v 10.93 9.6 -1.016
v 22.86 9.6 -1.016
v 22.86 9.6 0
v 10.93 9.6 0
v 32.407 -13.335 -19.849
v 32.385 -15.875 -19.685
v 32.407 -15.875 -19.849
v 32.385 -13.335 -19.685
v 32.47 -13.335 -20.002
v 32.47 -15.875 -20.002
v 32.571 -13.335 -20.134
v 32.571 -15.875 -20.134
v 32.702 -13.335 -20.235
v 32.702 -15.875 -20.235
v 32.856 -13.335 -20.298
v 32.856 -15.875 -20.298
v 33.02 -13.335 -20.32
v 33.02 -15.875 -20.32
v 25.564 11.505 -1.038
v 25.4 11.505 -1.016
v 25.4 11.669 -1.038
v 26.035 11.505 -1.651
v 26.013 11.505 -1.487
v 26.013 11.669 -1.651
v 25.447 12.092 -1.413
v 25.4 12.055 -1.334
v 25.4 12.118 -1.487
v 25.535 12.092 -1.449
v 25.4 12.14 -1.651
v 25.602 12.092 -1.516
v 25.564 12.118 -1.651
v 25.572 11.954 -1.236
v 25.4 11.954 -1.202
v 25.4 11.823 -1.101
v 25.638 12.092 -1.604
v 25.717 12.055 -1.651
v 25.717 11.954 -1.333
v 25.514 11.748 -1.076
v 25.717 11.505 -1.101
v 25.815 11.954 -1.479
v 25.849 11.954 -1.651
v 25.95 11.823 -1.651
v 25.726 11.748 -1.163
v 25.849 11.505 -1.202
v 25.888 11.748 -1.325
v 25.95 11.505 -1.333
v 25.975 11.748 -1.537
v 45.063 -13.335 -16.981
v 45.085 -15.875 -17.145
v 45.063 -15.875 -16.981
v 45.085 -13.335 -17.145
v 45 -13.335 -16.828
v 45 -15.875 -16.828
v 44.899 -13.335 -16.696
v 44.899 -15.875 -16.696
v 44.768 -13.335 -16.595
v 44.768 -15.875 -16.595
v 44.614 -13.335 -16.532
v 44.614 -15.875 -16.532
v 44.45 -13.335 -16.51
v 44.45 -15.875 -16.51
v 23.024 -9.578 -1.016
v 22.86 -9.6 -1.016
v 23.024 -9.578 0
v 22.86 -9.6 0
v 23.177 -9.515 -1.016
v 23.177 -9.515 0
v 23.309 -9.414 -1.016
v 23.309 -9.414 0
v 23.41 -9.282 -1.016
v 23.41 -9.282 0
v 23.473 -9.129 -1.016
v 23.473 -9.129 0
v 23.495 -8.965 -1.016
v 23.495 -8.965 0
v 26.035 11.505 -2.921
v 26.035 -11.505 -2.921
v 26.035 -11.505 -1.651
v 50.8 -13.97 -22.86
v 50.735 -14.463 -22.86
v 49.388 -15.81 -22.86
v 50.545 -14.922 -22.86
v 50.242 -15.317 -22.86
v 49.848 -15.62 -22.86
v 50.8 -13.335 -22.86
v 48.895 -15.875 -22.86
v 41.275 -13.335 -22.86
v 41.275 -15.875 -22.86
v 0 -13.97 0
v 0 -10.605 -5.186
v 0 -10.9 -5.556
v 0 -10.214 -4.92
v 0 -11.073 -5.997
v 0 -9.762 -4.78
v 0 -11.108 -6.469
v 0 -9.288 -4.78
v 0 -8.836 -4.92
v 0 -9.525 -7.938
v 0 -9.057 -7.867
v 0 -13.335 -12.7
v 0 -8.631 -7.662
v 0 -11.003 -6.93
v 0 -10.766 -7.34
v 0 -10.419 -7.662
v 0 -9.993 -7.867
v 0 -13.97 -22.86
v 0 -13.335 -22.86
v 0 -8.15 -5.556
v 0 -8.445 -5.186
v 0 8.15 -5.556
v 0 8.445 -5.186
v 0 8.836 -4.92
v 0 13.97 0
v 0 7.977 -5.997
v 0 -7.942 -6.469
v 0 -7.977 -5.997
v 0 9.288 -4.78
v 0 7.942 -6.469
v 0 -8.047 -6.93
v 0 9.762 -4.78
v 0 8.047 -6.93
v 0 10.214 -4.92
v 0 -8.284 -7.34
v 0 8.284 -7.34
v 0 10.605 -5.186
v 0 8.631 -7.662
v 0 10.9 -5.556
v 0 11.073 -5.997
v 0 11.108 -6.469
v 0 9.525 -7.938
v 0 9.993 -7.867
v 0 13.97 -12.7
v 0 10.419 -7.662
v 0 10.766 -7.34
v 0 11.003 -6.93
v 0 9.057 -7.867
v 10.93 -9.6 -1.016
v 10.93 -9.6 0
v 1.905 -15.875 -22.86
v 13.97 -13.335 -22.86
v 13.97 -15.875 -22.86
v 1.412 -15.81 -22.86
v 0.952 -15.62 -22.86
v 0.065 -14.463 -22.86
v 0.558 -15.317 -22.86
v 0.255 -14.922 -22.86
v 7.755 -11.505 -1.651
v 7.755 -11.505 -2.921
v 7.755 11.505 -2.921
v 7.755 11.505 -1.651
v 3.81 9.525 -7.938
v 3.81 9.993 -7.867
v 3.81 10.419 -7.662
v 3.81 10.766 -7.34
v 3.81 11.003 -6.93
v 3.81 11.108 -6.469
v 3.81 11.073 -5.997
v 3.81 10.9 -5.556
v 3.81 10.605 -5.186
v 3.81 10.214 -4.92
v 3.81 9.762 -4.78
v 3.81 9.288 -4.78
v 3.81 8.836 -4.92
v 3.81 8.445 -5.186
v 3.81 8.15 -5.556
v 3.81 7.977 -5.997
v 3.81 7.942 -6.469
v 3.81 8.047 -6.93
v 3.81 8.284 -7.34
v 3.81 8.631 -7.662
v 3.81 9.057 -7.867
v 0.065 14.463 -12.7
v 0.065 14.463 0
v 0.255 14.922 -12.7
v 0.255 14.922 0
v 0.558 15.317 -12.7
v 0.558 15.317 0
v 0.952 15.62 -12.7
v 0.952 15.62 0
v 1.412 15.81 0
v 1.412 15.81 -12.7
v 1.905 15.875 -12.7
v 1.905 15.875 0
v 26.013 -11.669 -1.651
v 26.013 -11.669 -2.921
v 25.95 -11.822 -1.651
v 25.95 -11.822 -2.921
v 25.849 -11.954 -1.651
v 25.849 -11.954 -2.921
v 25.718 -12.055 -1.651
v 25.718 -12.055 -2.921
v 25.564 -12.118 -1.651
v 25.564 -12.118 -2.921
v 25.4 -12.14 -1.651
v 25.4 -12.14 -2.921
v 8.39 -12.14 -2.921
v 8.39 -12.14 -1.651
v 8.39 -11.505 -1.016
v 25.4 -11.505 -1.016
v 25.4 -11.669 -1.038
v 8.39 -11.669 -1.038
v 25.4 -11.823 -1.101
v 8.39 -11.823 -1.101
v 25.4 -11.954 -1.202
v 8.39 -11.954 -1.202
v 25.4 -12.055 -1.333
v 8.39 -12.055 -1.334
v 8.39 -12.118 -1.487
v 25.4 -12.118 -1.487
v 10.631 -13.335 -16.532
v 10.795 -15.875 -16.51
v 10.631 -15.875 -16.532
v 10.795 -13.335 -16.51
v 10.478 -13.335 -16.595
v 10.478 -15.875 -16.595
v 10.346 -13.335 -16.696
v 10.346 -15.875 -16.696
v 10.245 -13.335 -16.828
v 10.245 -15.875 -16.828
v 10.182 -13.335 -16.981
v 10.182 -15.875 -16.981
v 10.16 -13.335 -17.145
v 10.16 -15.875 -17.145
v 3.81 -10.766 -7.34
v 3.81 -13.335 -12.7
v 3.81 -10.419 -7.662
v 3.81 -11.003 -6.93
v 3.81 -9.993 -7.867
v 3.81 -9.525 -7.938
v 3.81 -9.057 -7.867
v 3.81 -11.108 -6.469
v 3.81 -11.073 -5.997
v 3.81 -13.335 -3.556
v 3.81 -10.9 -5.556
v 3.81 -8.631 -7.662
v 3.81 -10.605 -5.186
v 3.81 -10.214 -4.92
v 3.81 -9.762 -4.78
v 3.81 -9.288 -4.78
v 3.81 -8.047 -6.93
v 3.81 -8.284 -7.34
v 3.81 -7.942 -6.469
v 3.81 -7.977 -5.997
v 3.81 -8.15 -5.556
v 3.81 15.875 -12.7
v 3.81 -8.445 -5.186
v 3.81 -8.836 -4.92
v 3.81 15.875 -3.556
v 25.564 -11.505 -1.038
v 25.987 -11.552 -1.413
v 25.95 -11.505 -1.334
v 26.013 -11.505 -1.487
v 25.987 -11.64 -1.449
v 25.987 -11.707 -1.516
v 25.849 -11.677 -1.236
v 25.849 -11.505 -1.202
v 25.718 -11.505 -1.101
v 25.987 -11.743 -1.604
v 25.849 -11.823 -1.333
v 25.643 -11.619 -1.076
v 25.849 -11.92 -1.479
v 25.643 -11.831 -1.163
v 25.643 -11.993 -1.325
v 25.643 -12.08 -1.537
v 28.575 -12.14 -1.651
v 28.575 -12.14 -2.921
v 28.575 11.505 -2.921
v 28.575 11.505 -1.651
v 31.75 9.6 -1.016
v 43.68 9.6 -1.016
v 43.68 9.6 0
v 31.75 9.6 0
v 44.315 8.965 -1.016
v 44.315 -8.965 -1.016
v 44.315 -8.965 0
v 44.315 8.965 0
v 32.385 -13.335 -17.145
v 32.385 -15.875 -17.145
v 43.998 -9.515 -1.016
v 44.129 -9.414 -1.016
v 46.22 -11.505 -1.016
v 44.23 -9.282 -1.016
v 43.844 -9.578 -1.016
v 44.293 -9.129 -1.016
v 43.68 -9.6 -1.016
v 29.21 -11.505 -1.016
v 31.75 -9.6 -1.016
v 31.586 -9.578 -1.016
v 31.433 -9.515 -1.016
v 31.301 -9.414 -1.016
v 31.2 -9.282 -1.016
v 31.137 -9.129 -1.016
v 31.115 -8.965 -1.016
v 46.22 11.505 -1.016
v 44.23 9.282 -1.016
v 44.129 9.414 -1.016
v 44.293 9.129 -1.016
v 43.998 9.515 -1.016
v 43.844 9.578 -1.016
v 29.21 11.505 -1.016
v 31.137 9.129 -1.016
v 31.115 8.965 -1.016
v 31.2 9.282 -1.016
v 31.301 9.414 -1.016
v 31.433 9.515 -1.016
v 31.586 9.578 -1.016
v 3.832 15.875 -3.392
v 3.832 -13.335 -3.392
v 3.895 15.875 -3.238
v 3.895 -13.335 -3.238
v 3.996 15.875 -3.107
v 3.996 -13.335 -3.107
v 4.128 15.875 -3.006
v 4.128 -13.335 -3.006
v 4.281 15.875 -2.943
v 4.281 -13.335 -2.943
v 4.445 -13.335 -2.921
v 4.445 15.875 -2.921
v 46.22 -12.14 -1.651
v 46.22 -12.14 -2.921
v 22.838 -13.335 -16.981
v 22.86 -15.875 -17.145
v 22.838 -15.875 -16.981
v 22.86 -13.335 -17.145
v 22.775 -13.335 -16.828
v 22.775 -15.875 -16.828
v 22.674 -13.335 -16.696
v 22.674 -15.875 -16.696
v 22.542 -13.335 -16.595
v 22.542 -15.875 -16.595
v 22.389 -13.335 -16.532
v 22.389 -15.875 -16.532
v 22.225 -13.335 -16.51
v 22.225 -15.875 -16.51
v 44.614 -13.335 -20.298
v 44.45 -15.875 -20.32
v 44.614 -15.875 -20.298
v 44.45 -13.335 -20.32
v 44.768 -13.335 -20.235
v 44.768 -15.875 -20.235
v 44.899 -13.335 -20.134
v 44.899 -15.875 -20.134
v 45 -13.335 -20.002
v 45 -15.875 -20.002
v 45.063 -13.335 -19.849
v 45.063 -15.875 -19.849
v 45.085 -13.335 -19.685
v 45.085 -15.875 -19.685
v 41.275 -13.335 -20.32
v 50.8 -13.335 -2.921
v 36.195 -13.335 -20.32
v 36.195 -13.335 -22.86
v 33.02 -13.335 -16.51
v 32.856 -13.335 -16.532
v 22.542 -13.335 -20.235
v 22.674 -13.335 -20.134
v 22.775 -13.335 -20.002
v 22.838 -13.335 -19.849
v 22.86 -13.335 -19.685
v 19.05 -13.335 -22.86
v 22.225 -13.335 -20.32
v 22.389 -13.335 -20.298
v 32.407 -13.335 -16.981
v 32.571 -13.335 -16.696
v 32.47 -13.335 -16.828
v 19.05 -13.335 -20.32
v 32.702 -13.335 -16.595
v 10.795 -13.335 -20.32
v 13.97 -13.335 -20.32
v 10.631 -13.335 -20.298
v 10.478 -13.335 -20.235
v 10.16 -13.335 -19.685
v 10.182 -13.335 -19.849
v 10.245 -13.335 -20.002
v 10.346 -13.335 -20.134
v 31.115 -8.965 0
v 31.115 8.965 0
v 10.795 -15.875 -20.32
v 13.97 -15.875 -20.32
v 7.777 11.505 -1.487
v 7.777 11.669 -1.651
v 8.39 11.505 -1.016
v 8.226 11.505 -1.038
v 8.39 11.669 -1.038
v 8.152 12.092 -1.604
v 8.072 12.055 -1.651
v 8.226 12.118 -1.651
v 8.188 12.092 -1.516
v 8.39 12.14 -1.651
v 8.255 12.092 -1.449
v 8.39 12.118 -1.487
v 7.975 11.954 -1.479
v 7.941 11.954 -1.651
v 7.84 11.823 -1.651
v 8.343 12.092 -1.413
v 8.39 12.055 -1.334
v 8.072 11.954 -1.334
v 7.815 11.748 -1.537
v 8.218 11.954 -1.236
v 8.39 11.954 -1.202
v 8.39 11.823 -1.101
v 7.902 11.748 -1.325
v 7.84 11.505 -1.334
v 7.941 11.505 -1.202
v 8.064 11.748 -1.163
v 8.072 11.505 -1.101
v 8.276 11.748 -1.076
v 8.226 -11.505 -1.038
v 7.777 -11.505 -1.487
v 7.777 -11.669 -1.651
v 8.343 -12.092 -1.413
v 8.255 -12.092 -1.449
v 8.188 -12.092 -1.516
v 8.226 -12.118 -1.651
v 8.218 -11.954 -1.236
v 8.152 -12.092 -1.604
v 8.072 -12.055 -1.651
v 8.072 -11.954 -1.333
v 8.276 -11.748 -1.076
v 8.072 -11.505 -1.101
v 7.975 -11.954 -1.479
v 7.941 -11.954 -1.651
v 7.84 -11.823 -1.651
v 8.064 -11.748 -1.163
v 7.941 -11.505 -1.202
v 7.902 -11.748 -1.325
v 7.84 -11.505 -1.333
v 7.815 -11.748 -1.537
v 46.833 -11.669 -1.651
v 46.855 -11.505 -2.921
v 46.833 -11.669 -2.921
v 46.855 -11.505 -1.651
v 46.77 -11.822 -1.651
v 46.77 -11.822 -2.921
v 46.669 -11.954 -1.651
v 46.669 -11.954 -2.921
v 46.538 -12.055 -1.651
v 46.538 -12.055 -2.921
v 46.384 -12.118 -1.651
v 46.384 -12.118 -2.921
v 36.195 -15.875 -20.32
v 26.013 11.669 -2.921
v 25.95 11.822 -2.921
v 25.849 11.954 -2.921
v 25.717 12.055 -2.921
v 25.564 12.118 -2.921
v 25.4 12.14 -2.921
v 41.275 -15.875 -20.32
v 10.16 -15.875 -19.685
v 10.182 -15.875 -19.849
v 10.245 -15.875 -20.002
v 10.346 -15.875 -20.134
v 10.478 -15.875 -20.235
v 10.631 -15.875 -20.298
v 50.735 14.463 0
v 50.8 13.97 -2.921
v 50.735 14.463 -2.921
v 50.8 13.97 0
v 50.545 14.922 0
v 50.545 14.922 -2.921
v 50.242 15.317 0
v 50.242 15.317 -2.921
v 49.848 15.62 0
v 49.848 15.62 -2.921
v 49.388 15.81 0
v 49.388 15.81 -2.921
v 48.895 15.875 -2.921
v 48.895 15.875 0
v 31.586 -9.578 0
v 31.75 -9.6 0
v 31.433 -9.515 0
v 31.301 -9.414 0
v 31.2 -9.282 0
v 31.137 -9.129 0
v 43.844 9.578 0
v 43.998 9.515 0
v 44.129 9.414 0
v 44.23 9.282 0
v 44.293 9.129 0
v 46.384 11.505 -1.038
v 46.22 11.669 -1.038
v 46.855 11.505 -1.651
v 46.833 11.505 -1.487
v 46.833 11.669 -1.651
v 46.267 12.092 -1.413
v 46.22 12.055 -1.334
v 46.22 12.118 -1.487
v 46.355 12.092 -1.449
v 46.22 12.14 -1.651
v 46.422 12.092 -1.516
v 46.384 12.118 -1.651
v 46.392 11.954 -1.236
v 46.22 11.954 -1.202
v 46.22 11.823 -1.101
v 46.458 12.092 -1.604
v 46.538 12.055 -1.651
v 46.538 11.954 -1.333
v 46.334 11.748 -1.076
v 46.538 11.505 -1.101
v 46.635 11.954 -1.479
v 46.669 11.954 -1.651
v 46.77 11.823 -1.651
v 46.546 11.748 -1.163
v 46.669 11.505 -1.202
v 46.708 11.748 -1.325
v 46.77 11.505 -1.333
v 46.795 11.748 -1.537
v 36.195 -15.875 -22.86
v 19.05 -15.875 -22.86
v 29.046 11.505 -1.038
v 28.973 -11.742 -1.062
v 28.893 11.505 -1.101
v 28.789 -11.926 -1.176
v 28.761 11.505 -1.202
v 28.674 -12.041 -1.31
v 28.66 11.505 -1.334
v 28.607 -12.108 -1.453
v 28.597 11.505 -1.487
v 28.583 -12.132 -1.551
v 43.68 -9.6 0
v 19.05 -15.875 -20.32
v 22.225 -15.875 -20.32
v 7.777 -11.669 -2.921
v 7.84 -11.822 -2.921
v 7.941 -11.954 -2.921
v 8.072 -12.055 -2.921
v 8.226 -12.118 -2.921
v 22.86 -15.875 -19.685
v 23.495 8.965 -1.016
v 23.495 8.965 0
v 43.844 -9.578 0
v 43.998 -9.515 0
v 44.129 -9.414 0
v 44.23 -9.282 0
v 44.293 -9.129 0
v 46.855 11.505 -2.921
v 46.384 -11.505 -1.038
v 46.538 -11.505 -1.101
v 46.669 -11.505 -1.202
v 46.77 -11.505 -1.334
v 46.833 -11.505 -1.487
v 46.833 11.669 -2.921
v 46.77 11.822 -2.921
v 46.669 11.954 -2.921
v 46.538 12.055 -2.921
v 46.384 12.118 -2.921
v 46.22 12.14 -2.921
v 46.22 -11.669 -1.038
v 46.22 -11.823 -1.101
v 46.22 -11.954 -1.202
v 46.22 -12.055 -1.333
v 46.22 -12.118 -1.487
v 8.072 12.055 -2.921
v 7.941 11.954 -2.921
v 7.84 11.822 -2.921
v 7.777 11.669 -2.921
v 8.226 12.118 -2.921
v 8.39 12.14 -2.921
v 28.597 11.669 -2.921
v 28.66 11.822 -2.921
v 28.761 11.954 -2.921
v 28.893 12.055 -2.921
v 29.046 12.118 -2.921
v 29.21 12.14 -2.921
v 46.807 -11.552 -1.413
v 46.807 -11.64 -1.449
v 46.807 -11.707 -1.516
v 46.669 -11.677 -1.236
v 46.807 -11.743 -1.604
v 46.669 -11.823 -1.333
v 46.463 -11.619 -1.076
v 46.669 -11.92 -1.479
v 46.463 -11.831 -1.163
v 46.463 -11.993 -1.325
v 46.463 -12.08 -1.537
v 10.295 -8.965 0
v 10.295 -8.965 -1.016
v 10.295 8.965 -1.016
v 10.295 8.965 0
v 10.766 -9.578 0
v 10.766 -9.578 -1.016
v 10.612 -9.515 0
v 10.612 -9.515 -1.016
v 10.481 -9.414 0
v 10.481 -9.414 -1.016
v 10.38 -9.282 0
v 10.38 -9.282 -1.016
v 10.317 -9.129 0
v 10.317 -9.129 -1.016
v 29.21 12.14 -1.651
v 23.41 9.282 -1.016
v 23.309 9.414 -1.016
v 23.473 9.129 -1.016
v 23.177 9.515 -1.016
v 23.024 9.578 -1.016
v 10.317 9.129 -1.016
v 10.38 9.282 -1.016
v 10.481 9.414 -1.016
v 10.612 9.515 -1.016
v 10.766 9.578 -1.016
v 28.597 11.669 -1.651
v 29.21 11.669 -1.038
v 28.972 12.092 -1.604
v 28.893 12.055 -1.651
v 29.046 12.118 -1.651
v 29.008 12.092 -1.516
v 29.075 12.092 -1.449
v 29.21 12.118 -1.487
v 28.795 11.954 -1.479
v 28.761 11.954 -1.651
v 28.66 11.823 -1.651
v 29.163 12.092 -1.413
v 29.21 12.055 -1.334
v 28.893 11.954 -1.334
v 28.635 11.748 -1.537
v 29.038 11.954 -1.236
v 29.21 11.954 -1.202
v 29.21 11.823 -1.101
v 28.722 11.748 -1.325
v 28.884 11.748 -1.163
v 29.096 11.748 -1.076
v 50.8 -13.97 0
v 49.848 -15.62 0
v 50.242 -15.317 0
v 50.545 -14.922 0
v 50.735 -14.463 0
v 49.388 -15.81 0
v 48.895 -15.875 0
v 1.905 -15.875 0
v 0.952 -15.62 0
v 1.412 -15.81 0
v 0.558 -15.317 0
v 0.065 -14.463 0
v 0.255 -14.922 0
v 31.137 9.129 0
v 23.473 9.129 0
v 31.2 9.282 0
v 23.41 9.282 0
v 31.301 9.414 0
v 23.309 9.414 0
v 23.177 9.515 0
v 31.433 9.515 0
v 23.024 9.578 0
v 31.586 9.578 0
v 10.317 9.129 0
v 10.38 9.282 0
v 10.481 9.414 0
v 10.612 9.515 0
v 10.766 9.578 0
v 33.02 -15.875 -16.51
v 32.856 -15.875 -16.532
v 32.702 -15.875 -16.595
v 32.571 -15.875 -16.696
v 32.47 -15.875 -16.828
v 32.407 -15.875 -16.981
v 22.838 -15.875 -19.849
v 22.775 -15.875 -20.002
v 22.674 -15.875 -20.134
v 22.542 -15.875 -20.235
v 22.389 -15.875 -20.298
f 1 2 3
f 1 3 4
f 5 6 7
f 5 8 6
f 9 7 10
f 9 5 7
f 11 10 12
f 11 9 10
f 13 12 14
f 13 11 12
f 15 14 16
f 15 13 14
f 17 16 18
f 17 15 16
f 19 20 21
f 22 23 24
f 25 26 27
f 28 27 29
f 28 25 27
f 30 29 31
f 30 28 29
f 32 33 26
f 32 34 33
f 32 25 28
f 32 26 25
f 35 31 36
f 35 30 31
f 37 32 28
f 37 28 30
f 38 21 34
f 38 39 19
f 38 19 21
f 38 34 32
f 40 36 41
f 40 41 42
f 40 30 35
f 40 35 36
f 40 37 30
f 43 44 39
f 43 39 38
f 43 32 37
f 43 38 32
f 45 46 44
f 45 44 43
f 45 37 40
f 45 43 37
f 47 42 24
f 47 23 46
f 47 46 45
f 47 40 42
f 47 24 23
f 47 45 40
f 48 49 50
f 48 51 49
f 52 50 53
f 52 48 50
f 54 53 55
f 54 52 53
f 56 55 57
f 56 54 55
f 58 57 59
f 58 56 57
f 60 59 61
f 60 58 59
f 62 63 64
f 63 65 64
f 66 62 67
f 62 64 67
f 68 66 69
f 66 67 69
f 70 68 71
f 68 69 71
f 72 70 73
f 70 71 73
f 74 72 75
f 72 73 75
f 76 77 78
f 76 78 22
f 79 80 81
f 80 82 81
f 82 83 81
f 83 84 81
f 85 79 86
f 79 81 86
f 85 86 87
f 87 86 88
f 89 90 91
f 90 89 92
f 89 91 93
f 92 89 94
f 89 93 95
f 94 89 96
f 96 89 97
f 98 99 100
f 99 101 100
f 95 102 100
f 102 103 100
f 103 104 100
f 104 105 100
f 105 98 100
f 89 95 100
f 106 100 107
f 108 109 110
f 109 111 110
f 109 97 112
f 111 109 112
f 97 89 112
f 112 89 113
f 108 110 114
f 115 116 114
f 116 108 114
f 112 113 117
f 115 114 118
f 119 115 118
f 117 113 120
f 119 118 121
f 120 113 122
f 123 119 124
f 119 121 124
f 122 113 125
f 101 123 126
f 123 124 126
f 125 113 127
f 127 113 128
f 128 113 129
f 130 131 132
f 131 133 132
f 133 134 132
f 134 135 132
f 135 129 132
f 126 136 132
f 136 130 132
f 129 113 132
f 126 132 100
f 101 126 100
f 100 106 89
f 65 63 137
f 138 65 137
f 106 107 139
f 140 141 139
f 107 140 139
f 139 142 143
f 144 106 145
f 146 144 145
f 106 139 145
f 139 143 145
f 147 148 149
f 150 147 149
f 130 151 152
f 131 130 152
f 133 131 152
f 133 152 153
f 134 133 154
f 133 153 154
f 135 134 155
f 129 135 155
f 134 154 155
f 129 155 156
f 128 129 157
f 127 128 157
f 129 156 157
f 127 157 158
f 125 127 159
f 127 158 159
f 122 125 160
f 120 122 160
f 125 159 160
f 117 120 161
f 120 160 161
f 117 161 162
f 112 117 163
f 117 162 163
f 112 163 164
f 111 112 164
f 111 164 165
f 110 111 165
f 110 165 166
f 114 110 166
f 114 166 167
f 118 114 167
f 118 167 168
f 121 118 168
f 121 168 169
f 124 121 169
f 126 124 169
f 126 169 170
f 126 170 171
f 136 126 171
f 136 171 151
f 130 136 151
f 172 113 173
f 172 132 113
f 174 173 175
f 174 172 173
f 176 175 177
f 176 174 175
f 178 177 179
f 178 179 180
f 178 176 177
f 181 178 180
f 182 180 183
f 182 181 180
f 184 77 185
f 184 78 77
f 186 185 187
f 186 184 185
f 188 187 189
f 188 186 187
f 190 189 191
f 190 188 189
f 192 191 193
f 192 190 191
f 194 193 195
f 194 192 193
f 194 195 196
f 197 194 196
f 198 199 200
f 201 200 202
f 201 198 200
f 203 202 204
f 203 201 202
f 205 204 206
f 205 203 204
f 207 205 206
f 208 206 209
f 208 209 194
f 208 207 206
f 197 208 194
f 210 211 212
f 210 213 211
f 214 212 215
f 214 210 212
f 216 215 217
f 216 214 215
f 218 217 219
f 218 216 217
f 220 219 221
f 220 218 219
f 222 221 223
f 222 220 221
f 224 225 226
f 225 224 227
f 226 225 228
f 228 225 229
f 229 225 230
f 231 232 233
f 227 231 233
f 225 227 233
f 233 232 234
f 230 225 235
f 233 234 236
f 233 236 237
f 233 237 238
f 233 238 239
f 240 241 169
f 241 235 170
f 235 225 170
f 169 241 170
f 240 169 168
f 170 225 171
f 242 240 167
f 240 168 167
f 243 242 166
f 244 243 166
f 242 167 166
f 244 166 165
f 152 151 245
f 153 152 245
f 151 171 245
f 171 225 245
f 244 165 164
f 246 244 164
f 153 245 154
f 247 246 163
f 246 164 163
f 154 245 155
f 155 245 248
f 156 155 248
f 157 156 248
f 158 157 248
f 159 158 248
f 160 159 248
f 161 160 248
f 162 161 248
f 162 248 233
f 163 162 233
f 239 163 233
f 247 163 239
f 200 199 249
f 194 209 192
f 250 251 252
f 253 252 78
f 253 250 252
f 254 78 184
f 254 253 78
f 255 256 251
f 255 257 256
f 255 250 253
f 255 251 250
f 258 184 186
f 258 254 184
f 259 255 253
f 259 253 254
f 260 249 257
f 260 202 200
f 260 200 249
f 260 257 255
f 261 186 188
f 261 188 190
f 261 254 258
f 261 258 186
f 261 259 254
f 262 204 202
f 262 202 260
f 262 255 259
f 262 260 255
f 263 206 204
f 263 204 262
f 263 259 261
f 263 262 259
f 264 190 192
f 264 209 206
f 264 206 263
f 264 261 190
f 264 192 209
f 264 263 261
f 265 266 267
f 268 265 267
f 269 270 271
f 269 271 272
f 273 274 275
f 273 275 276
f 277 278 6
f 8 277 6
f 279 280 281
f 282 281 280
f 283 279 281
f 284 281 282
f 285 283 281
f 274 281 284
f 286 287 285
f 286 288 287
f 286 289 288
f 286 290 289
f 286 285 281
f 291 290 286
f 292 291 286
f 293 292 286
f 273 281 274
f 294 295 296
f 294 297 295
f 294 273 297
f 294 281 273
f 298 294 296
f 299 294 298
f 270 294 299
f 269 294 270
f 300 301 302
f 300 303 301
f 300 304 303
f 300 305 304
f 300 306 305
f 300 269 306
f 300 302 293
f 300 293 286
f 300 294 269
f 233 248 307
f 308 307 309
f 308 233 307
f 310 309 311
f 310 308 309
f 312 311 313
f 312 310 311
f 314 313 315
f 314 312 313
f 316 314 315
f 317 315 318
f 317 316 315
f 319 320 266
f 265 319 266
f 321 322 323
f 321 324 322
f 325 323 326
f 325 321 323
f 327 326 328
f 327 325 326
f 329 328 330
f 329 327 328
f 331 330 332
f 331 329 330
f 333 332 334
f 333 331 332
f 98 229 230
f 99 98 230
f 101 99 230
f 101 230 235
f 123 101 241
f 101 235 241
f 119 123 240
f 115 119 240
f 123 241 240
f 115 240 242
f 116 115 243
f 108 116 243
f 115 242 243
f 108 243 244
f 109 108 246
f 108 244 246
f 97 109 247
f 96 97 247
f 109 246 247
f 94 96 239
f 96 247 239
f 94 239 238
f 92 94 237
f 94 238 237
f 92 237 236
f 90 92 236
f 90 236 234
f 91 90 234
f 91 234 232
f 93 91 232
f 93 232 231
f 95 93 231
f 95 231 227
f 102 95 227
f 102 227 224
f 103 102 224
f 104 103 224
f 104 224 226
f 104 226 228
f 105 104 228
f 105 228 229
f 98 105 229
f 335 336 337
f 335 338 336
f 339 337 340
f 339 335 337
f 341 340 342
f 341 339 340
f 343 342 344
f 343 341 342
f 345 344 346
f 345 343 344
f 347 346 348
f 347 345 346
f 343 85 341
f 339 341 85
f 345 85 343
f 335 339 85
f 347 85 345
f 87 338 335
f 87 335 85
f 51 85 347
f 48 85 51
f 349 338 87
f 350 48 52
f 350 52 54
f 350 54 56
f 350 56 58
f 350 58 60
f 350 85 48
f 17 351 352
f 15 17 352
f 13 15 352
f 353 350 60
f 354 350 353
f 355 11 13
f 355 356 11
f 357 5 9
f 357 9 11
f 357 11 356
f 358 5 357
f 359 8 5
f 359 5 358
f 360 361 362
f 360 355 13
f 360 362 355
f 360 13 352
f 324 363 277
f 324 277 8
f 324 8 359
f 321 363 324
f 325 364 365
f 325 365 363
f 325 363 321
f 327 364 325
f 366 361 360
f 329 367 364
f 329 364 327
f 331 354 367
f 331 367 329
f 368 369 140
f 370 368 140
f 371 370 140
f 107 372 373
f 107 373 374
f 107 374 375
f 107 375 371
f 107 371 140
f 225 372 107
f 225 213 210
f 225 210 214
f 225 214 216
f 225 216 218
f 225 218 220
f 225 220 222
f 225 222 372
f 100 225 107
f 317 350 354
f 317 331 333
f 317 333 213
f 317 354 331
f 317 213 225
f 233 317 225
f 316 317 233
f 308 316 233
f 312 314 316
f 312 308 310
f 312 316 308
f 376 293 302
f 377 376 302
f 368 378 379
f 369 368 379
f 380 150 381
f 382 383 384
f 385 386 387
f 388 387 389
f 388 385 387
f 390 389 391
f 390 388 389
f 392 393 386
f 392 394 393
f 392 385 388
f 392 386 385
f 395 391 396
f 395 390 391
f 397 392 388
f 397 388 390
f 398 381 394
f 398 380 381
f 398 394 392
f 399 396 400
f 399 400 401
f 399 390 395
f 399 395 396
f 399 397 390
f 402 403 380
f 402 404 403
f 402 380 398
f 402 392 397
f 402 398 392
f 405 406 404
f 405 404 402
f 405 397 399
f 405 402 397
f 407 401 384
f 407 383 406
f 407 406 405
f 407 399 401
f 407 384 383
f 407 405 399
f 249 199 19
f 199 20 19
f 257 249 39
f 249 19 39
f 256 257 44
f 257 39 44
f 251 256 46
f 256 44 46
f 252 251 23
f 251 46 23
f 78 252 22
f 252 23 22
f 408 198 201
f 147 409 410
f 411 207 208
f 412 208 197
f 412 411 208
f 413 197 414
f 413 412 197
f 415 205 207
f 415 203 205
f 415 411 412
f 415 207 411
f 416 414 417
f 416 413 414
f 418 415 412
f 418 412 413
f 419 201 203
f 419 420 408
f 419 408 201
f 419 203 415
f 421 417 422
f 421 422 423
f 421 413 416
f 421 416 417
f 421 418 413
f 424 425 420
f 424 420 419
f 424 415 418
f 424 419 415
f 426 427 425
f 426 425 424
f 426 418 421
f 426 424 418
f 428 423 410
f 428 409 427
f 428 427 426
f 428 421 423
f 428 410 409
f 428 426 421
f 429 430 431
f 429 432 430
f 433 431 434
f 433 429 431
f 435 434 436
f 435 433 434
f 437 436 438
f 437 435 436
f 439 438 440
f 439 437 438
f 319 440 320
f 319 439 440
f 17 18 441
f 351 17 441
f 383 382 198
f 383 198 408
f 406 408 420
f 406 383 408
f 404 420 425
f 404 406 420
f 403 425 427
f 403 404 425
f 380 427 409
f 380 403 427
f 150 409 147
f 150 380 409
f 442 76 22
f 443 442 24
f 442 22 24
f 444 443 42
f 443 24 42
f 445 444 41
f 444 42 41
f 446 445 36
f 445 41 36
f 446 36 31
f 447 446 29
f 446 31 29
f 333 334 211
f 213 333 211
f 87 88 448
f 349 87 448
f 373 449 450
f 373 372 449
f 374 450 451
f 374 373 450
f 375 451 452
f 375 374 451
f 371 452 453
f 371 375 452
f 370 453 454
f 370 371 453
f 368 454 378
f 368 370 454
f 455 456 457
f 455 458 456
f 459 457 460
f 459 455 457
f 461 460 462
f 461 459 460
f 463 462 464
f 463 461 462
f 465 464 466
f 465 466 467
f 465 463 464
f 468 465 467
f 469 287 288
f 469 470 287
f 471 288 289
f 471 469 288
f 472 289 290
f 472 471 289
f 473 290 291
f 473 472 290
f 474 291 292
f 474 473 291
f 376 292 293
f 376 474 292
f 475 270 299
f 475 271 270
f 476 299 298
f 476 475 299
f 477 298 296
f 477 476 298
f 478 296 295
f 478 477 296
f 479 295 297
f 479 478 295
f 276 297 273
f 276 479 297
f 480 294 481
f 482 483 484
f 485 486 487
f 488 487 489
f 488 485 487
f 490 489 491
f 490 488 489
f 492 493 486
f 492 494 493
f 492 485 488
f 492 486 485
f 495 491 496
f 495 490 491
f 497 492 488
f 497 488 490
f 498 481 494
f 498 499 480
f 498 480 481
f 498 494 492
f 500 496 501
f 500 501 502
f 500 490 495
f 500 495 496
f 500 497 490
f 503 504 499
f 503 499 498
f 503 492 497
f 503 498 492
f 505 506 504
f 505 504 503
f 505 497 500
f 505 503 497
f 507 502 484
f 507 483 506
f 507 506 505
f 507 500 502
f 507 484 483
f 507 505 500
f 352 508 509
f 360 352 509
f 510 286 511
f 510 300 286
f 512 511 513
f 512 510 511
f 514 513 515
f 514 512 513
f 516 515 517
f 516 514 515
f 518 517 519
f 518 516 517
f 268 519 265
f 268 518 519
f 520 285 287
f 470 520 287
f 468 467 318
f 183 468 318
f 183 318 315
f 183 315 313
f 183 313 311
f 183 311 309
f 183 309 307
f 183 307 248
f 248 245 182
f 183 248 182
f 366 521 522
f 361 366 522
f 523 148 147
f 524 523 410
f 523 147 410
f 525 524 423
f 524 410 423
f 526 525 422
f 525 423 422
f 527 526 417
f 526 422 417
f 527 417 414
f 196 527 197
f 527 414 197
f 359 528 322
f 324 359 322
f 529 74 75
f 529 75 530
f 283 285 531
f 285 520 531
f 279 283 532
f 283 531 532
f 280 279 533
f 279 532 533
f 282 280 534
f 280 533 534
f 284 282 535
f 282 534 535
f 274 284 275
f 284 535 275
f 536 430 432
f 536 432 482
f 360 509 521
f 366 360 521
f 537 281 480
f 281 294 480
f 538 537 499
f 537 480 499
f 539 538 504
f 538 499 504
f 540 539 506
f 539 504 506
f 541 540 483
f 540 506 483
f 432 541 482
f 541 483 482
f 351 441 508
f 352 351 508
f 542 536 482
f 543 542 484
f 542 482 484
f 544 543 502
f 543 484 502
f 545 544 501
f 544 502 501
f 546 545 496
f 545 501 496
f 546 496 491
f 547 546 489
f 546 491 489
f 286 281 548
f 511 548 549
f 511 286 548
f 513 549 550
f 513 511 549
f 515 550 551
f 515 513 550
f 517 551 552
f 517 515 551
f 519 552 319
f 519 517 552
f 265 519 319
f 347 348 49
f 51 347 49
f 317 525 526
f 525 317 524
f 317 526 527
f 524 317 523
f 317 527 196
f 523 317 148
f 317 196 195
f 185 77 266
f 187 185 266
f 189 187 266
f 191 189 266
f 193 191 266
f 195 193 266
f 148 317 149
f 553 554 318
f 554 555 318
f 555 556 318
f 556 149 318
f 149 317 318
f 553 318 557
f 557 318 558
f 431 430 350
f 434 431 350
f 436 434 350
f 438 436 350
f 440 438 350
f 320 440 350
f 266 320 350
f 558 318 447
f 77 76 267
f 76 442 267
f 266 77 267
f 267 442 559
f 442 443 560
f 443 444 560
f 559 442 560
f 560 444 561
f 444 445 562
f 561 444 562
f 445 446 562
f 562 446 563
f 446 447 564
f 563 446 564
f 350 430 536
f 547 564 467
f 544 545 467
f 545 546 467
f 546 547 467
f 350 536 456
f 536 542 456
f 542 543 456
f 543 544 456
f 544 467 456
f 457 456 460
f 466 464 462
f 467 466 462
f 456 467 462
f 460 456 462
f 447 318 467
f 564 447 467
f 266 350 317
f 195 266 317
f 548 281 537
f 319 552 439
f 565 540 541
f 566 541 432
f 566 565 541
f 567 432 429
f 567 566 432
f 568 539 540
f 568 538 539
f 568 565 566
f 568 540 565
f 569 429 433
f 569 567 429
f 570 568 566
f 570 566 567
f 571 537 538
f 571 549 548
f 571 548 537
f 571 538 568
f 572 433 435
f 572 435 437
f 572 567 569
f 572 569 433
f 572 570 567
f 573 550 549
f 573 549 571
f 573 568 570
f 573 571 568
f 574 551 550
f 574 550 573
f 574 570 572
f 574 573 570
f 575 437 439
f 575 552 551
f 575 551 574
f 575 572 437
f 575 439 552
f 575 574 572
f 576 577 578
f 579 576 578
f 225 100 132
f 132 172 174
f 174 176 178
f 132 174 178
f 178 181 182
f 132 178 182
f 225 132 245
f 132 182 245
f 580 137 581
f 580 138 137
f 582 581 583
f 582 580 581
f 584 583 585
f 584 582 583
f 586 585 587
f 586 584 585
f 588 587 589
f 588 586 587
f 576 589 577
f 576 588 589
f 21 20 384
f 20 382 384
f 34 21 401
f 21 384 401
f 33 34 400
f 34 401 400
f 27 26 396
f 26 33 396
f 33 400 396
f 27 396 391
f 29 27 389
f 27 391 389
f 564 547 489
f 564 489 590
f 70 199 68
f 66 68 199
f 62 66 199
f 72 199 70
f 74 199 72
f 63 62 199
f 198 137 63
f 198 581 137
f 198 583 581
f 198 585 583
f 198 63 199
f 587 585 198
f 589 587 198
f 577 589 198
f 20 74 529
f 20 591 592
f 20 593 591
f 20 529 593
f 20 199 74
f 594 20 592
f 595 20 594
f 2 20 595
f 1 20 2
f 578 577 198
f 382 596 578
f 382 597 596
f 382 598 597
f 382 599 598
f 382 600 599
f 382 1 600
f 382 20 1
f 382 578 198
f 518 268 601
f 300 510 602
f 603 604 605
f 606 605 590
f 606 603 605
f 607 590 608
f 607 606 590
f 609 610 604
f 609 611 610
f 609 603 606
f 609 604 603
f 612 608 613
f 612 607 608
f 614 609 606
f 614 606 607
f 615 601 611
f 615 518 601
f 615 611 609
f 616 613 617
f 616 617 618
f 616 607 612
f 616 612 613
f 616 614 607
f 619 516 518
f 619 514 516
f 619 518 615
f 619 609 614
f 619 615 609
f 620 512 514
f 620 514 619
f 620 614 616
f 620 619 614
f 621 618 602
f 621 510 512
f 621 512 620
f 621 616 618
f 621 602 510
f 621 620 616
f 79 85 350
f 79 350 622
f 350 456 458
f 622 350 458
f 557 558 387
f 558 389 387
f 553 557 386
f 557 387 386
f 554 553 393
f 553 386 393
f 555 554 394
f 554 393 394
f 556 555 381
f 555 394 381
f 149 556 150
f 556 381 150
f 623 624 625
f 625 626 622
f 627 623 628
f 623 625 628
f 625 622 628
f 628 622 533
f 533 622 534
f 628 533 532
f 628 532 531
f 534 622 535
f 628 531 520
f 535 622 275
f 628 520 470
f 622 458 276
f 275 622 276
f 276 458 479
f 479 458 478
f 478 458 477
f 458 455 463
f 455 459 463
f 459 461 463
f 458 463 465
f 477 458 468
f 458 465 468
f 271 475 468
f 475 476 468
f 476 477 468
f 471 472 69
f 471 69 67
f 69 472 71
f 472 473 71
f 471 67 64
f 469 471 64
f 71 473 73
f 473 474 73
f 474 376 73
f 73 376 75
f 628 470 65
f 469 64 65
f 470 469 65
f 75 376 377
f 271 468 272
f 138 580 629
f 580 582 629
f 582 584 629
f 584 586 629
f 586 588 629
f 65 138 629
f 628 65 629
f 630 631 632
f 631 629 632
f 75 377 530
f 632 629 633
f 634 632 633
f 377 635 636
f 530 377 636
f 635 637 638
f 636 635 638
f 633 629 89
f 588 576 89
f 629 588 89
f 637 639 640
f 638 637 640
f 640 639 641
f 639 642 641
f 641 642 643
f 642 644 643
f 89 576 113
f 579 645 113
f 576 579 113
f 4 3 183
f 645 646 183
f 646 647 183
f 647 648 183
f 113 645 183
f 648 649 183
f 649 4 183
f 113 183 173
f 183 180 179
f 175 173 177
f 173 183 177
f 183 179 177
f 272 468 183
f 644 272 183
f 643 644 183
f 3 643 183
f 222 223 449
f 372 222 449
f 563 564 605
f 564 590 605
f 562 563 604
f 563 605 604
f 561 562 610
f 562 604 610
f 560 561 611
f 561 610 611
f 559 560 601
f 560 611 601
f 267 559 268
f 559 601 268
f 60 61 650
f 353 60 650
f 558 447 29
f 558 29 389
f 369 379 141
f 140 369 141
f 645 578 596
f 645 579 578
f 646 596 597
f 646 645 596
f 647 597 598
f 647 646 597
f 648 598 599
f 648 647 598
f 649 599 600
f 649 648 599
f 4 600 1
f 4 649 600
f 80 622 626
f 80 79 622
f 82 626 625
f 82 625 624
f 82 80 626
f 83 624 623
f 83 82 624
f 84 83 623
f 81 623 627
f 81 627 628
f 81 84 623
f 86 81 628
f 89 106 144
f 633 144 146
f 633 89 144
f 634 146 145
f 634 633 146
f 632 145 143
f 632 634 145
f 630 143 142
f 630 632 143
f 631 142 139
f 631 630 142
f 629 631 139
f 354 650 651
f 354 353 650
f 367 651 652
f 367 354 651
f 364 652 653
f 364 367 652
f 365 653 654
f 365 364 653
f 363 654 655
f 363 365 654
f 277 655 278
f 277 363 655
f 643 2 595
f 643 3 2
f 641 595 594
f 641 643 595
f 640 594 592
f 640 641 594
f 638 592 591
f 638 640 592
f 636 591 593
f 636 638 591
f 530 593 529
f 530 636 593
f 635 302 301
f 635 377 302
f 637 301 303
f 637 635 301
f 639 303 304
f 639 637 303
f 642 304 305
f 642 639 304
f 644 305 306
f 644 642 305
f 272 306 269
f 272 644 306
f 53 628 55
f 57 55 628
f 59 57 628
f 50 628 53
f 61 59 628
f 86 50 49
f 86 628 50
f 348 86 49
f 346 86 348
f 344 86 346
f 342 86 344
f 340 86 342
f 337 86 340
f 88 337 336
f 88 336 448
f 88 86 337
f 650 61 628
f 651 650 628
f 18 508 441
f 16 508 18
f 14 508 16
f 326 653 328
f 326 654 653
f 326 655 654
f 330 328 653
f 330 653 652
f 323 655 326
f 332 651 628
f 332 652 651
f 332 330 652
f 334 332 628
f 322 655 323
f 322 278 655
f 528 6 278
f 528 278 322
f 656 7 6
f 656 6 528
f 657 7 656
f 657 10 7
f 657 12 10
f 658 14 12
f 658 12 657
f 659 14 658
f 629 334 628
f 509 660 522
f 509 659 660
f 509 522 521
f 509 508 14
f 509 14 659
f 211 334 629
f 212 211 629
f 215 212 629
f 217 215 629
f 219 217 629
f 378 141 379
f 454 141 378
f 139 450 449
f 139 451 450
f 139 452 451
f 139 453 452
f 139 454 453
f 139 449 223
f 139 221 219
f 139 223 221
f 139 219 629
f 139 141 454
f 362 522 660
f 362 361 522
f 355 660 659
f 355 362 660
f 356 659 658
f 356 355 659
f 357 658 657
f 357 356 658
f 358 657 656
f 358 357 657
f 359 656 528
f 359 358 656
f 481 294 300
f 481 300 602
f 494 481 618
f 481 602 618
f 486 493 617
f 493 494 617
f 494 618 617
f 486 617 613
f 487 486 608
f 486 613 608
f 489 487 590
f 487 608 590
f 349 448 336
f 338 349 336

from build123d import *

# Parameters (mm, degrees)
BOSS_EXTRUDE1_DEPTH  = 15.875
SKETCH2_R            = 1.5875
MOUNTING_HOLES_DEPTH = 52.199274653
SKETCH3_W            = 13.2
SKETCH3_H            = 19.2
CUT_EXTRUDE2_DEPTH   = 55.113625512
SKETCH4_W            = 18.28
SKETCH4_H            = 24.28
SKETCH4_W_2          = 13.2
SKETCH4_H_2          = 19.2
CUT_EXTRUDE3_DEPTH   = 1.905
FILLET2_R            = 0.635
FILLET3_R            = 0.635
BOSS_EXTRUDE3_DEPTH  = 2.54
FILLET4_R            = 0.635
FILLET5_R            = 1.905


with BuildPart() as part:
    # Sketch1 → Boss-Extrude1 (new, symmetric)
    with BuildSketch(Plane(origin=(0, 0, 0), x_dir=(1, 0, 0), z_dir=(0, 1, 0))):
        Polygon((0, 0), (0, 12.7), (3.81, 12.7), (3.81, 2.921), (50.8, 2.921), (50.8, 0), align=None)
    extrude(amount=BOSS_EXTRUDE1_DEPTH, both=True)

    # Sketch2 → Mounting_Holes (cut, through all)
    with BuildSketch(Plane(origin=(3.81, 0, 0), x_dir=(0, 0, -1), z_dir=(1, 0, 0))):
        with Locations((6.35, 9.525)):
            Circle(SKETCH2_R)
        with Locations((6.35, -9.525)):
            Circle(SKETCH2_R)
    extrude(amount=-MOUNTING_HOLES_DEPTH, mode=Mode.SUBTRACT)

    # Sketch3 → Cut-Extrude2 (cut, through all)
    with BuildSketch(Plane(origin=(0, 0, -2.921), x_dir=(-1, 0, 0), z_dir=(0, 0, -1))):
        with Locations((-37.715, 0)):
            Rectangle(SKETCH3_W, SKETCH3_H)
        with Locations((-16.895, 0)):
            Rectangle(SKETCH3_W, SKETCH3_H)
    extrude(amount=-CUT_EXTRUDE2_DEPTH, mode=Mode.SUBTRACT)

    # Sketch4 → Cut-Extrude3 (cut)
    # profile 1 of 2: a face of its own
    with BuildSketch(Plane(origin=(0, 0, -2.921), x_dir=(-1, 0, 0), z_dir=(0, 0, -1))):
        with Locations((-37.715, 0)):
            Rectangle(SKETCH4_W, SKETCH4_H)
        with Locations((-37.715, 0)):
            Rectangle(SKETCH4_W_2, SKETCH4_H_2, mode=Mode.SUBTRACT)
    # profile 2 of 2: a face of its own
    with BuildSketch(Plane(origin=(0, 0, -2.921), x_dir=(-1, 0, 0), z_dir=(0, 0, -1))):
        with Locations((-16.895, 0)):
            Rectangle(SKETCH4_W, SKETCH4_H)
        with Locations((-16.895, 0)):
            Rectangle(SKETCH4_W_2, SKETCH4_H_2, mode=Mode.SUBTRACT)
    extrude(amount=-CUT_EXTRUDE3_DEPTH, mode=Mode.SUBTRACT)

    # Fillet2
    fillet2_edges = [part.edges().sort_by_distance(p)[0] for p in [
        (3.81, 0, -2.921),
        (23.495, -9.6, -0.508),
        (23.495, 9.6, -0.508),
        (10.295, 9.6, -0.508),
        (10.295, -9.6, -0.508),
        (44.315, 9.6, -0.508),
        (31.115, 9.6, -0.508),
        (31.115, -9.6, -0.508),
        (44.315, -9.6, -0.508),
    ]]
    fillet(fillet2_edges, radius=FILLET2_R)

    # Fillet3
    fillet3_edges = [part.edges().sort_by_distance(p)[0] for p in [
        (28.575, 0, -1.016),
        (28.575, 12.14, -1.9685),
        (37.715, -12.14, -1.016),
        (46.855, 0, -1.016),
        (46.855, -12.14, -1.9685),
        (37.715, 12.14, -1.016),
        (46.855, 12.14, -1.9685),
        (7.755, 0, -1.016),
        (7.755, 12.14, -1.9685),
        (16.895, -12.14, -1.016),
        (7.755, -12.14, -1.9685),
        (26.035, 0, -1.016),
        (26.035, -12.14, -1.9685),
        (16.895, 12.14, -1.016),
        (26.035, 12.14, -1.9685),
    ]]
    fillet(fillet3_edges, radius=FILLET3_R)

    # Sketch5 → Boss-Extrude3 (add)
    with BuildSketch(Plane.XZ.offset(15.875)):
        Polygon((50.8, 0), (50.8, -22.86), (41.275, -22.86), (41.275, -20.32), (45.085, -20.32), (45.085, -16.51), (32.385, -16.51), (32.385, -20.32), (36.195, -20.32), (36.195, -22.86), (19.05, -22.86), (19.05, -20.32), (22.86, -20.32), (22.86, -16.51), (10.16, -16.51), (10.16, -20.32), (13.97, -20.32), (13.97, -22.86), (0, -22.86), (0, 0), align=None)
    extrude(amount=-BOSS_EXTRUDE3_DEPTH)

    # Fillet4
    fillet4_edges = [part.edges().sort_by_distance(p)[0] for p in [
        (45.085, -14.605, -20.32),
        (45.085, -14.605, -16.51),
        (32.385, -14.605, -16.51),
        (32.385, -14.605, -20.32),
        (22.86, -14.605, -20.32),
        (22.86, -14.605, -16.51),
        (10.16, -14.605, -16.51),
        (10.16, -14.605, -20.32),
    ]]
    fillet(fillet4_edges, radius=FILLET4_R)

    # Fillet5
    fillet5_edges = [part.edges().sort_by_distance(p)[0] for p in [
        (0, 15.875, -6.35),
        (0, -15.875, -11.43),
        (50.8, -15.875, -11.43),
        (50.8, 15.875, -1.4605),
    ]]
    fillet(fillet5_edges, radius=FILLET5_R)


solid = part.part
